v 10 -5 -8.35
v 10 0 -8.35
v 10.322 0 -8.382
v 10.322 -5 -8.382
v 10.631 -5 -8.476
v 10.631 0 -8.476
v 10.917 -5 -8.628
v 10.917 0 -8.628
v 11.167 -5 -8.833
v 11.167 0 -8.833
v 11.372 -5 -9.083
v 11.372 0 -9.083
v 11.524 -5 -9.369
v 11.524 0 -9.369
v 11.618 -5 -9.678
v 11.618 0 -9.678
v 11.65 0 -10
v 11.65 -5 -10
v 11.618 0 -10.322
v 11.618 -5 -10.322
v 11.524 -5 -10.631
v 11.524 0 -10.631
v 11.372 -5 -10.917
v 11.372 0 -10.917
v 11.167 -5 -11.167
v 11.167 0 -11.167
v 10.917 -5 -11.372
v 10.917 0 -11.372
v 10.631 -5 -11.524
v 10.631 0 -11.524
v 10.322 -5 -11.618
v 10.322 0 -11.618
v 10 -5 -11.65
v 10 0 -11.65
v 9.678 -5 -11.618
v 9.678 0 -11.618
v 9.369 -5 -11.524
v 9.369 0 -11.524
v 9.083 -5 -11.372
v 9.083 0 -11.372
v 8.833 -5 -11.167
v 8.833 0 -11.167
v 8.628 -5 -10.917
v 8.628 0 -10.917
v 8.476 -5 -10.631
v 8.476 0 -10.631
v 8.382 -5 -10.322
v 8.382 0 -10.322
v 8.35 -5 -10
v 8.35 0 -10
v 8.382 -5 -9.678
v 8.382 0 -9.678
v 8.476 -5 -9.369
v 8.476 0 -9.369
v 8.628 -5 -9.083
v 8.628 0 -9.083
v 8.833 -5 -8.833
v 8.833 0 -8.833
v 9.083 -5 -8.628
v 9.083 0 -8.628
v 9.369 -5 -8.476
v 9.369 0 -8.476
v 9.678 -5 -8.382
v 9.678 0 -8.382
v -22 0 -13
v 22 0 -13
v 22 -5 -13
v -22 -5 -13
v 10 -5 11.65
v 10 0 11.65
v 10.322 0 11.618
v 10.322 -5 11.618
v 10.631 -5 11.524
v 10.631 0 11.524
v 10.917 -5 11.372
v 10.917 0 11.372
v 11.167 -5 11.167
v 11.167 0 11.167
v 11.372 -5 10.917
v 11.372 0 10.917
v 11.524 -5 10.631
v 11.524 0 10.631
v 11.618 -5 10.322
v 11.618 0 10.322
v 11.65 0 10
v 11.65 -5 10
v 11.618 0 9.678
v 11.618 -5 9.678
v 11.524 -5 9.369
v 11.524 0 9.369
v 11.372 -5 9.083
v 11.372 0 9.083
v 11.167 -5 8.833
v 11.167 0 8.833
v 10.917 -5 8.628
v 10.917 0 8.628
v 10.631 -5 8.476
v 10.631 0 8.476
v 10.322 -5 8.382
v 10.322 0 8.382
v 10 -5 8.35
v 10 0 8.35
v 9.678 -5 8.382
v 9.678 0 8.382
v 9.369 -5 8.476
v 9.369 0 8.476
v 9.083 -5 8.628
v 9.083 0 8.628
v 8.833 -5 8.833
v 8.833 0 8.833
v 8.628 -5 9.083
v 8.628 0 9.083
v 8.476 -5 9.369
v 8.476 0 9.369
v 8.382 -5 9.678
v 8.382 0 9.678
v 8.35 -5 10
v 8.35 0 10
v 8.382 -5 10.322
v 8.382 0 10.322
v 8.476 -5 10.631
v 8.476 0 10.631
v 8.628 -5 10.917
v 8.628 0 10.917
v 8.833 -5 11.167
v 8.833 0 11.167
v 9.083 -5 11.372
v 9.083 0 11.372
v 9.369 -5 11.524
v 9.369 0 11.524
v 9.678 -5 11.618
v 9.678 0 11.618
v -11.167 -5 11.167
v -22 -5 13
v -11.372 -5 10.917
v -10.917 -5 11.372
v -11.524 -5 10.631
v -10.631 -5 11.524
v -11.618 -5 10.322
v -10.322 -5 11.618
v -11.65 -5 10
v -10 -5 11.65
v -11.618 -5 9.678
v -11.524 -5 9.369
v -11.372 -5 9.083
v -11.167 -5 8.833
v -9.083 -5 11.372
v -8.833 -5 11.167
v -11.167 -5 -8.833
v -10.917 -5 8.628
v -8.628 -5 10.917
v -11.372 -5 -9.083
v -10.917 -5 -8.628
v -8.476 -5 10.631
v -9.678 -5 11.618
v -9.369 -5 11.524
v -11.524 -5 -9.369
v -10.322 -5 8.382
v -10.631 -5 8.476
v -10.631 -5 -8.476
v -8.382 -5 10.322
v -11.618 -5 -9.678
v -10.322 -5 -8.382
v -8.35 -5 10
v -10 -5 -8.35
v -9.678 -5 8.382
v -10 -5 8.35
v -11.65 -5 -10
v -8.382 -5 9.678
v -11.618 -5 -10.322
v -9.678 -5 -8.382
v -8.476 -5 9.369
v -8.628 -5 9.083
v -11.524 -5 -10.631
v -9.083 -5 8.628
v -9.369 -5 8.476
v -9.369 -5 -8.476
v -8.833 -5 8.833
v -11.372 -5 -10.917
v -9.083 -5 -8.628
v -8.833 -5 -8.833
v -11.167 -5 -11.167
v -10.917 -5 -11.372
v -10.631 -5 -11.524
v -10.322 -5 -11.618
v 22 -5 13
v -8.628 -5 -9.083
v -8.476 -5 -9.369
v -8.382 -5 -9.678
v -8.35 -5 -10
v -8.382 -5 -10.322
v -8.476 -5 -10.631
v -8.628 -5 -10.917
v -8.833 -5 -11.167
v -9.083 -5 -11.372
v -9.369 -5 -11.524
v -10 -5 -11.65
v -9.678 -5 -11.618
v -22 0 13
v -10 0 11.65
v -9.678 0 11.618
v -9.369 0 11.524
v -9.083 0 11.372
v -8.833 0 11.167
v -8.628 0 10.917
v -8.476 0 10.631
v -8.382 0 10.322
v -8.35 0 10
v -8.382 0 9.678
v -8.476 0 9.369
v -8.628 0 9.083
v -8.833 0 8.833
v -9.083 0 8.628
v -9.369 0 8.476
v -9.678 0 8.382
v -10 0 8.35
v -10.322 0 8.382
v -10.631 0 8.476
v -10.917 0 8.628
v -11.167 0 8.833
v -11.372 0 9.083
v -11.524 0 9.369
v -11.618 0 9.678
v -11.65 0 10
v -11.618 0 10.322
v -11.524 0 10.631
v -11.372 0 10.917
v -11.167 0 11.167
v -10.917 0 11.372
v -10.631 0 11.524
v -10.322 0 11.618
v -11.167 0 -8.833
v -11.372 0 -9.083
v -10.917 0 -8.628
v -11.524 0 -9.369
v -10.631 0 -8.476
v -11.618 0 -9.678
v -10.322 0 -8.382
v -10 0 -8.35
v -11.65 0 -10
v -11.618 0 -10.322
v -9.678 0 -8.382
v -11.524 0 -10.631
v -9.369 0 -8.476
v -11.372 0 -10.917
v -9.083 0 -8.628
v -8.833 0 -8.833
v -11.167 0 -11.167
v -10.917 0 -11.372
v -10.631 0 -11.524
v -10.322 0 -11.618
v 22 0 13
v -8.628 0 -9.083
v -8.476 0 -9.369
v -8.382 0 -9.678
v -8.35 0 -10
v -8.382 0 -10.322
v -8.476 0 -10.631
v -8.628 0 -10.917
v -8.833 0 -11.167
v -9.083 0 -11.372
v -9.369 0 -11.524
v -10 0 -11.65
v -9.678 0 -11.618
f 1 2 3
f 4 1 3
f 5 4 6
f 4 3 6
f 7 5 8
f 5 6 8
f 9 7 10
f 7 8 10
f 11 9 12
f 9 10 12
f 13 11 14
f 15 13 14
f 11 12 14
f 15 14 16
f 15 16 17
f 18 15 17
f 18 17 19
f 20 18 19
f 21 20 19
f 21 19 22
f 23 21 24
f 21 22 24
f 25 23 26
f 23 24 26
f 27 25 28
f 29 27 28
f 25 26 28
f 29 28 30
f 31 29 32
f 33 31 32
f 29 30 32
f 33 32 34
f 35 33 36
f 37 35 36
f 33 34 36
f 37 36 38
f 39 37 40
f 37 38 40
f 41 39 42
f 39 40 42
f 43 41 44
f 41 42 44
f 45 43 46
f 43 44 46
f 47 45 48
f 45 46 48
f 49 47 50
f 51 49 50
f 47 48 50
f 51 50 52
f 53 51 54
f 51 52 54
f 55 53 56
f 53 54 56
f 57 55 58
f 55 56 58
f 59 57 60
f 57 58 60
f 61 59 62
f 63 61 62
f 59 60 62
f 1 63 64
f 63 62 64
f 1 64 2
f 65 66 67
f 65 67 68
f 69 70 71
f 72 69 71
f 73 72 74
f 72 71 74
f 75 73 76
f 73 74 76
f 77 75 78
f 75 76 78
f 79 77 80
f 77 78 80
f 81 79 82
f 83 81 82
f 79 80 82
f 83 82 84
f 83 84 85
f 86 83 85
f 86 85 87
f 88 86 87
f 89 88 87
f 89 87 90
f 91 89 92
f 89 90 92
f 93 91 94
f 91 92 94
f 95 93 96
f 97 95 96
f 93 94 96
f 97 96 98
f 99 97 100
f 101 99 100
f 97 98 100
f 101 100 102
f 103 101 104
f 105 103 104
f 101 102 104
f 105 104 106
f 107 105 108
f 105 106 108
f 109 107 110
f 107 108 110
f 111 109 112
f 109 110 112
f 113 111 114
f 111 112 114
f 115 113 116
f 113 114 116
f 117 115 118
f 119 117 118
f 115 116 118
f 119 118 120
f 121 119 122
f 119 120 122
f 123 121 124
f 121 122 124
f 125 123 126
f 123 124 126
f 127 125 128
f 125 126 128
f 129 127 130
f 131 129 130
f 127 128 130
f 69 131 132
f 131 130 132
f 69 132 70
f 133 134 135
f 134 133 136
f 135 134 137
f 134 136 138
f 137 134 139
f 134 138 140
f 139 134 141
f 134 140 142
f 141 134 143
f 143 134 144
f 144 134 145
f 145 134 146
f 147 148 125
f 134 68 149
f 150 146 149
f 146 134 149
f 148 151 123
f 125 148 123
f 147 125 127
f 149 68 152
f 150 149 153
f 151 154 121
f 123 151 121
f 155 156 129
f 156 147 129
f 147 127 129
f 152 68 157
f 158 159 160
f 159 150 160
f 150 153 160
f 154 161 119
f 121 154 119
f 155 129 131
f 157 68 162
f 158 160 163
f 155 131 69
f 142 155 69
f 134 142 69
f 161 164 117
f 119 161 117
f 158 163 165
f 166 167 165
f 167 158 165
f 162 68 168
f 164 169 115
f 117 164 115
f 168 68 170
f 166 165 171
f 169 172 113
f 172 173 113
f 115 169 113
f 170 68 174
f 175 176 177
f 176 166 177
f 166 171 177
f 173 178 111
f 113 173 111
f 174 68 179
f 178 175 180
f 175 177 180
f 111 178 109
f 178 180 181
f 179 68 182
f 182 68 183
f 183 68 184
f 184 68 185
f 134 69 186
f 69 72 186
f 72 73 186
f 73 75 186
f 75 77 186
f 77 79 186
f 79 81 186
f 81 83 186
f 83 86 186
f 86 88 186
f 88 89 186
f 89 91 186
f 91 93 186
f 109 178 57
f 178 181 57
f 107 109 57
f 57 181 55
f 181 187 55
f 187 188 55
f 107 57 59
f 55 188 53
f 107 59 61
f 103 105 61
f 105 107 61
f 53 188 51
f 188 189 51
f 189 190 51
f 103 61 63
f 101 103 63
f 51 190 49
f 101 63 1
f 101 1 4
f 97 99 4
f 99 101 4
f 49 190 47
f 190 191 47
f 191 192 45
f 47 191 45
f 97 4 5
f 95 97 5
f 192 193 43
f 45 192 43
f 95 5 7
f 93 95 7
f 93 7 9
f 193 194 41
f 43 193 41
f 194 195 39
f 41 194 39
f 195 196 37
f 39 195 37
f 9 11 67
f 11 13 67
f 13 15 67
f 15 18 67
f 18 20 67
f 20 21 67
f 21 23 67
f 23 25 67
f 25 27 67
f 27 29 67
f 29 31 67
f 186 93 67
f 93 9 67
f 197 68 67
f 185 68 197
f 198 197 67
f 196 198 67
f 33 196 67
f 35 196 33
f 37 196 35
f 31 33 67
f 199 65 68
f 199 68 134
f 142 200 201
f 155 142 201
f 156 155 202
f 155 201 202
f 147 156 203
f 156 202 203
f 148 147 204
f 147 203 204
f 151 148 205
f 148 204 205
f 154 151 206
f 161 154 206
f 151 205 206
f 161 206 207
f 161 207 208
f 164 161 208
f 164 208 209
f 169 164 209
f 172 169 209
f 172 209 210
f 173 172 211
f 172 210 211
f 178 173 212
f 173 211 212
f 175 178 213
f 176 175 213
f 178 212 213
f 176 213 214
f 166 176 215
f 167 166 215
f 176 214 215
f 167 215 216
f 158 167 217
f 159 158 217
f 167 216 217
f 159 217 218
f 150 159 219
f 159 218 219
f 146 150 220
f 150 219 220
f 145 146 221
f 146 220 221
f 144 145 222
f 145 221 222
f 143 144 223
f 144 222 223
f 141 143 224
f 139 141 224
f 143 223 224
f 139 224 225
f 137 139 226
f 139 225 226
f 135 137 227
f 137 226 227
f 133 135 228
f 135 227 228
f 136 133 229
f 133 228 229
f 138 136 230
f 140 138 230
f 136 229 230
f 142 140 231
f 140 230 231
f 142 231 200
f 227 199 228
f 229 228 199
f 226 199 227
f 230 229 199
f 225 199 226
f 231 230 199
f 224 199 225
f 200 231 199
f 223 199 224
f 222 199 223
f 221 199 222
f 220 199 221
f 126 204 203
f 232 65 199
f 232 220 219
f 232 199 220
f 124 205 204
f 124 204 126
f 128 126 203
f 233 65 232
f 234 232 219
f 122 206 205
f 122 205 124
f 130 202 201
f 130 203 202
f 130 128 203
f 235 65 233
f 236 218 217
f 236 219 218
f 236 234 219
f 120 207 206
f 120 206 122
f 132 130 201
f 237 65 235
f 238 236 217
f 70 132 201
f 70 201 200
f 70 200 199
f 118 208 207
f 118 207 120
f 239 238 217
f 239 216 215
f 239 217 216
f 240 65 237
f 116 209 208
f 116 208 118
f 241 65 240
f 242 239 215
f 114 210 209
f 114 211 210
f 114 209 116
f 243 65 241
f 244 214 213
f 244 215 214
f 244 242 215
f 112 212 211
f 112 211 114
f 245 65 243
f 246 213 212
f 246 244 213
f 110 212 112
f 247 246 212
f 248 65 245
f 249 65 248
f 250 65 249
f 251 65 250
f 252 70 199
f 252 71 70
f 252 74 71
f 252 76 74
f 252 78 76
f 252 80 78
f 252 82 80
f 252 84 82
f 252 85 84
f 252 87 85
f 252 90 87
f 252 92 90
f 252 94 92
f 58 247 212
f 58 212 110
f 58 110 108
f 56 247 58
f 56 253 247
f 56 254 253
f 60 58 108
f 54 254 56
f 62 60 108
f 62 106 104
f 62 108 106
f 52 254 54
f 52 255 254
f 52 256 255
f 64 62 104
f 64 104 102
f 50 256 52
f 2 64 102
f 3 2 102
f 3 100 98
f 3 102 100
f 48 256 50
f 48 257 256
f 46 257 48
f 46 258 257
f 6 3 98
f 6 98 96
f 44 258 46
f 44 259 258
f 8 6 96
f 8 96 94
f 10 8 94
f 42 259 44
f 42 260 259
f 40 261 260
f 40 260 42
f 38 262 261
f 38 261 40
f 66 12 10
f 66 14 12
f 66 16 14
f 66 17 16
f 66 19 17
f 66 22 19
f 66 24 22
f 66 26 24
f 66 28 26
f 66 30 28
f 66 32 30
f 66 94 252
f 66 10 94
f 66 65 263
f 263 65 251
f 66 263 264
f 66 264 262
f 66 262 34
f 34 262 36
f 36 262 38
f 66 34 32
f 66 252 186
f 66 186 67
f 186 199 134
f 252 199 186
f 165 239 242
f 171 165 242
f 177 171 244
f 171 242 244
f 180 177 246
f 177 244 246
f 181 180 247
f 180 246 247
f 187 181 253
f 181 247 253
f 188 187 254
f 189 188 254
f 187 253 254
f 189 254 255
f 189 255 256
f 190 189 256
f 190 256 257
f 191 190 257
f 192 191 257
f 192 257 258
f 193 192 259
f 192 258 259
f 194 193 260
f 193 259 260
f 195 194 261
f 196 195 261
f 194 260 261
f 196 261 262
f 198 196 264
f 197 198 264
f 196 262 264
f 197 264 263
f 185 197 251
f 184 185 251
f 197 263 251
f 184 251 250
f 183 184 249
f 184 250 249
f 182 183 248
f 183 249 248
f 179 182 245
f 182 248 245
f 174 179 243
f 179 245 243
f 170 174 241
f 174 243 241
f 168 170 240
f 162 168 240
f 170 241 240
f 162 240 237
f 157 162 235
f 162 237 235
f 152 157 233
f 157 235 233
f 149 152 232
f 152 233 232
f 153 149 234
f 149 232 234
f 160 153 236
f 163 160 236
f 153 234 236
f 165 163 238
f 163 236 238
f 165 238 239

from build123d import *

# Parameters (mm, degrees)
SKETCH2_W           = 8.25
SKETCH2_H           = 8.25
SKETCH2_R           = 1.65
BOSS_EXTRUDE1_DEPTH = 5


with BuildPart() as part:
    # Sketch2 → Boss-Extrude1 (new body)
    # profile 1 of 5: a face of its own
    with BuildSketch(Plane(origin=(0, 0, 0), x_dir=(1, 0, 0), z_dir=(0, 1, 0))):
        with Locations((-10, 8.875)):
            Rectangle(SKETCH2_W, SKETCH2_H)
        with Locations(Location((-10, 10, 0), (0, 0, 270))):
            Circle(SKETCH2_R, mode=Mode.SUBTRACT)
    # profile 2 of 5: a face of its own
    with BuildSketch(Plane(origin=(0, 0, 0), x_dir=(1, 0, 0), z_dir=(0, 1, 0))):
        Polygon((-22, 13), (-22, -13), (-14.125, -13), (-14.125, -4.75), (-5.875, -4.75), (-5.875, -13), (5.875, -13), (5.875, -4.75), (14.125, -4.75), (14.125, -13), (22, -13), (22, 13), (14.125, 13), (14.125, 4.75), (5.875, 4.75), (5.875, 13), (-5.875, 13), (-5.875, 4.75), (-14.125, 4.75), (-14.125, 13), align=None)
    # profile 3 of 5: a face of its own
    with BuildSketch(Plane(origin=(0, 0, 0), x_dir=(1, 0, 0), z_dir=(0, 1, 0))):
        with Locations((10, 8.875)):
            Rectangle(SKETCH2_W, SKETCH2_H)
        with Locations(Location((10, 10, 0), (0, 0, 270))):
            Circle(SKETCH2_R, mode=Mode.SUBTRACT)
    # profile 4 of 5: a face of its own
    with BuildSketch(Plane(origin=(0, 0, 0), x_dir=(1, 0, 0), z_dir=(0, 1, 0))):
        with Locations((10, -8.875)):
            Rectangle(SKETCH2_W, SKETCH2_H)
        with Locations(Location((10, -10, 0), (0, 0, 270))):
            Circle(SKETCH2_R, mode=Mode.SUBTRACT)
    # profile 5 of 5: a face of its own
    with BuildSketch(Plane(origin=(0, 0, 0), x_dir=(1, 0, 0), z_dir=(0, 1, 0))):
        with Locations((-10, -8.875)):
            Rectangle(SKETCH2_W, SKETCH2_H)
        with Locations(Location((-10, -10, 0), (0, 0, 270))):
            Circle(SKETCH2_R, mode=Mode.SUBTRACT)
    extrude(amount=-BOSS_EXTRUDE1_DEPTH)


solid = part.part
